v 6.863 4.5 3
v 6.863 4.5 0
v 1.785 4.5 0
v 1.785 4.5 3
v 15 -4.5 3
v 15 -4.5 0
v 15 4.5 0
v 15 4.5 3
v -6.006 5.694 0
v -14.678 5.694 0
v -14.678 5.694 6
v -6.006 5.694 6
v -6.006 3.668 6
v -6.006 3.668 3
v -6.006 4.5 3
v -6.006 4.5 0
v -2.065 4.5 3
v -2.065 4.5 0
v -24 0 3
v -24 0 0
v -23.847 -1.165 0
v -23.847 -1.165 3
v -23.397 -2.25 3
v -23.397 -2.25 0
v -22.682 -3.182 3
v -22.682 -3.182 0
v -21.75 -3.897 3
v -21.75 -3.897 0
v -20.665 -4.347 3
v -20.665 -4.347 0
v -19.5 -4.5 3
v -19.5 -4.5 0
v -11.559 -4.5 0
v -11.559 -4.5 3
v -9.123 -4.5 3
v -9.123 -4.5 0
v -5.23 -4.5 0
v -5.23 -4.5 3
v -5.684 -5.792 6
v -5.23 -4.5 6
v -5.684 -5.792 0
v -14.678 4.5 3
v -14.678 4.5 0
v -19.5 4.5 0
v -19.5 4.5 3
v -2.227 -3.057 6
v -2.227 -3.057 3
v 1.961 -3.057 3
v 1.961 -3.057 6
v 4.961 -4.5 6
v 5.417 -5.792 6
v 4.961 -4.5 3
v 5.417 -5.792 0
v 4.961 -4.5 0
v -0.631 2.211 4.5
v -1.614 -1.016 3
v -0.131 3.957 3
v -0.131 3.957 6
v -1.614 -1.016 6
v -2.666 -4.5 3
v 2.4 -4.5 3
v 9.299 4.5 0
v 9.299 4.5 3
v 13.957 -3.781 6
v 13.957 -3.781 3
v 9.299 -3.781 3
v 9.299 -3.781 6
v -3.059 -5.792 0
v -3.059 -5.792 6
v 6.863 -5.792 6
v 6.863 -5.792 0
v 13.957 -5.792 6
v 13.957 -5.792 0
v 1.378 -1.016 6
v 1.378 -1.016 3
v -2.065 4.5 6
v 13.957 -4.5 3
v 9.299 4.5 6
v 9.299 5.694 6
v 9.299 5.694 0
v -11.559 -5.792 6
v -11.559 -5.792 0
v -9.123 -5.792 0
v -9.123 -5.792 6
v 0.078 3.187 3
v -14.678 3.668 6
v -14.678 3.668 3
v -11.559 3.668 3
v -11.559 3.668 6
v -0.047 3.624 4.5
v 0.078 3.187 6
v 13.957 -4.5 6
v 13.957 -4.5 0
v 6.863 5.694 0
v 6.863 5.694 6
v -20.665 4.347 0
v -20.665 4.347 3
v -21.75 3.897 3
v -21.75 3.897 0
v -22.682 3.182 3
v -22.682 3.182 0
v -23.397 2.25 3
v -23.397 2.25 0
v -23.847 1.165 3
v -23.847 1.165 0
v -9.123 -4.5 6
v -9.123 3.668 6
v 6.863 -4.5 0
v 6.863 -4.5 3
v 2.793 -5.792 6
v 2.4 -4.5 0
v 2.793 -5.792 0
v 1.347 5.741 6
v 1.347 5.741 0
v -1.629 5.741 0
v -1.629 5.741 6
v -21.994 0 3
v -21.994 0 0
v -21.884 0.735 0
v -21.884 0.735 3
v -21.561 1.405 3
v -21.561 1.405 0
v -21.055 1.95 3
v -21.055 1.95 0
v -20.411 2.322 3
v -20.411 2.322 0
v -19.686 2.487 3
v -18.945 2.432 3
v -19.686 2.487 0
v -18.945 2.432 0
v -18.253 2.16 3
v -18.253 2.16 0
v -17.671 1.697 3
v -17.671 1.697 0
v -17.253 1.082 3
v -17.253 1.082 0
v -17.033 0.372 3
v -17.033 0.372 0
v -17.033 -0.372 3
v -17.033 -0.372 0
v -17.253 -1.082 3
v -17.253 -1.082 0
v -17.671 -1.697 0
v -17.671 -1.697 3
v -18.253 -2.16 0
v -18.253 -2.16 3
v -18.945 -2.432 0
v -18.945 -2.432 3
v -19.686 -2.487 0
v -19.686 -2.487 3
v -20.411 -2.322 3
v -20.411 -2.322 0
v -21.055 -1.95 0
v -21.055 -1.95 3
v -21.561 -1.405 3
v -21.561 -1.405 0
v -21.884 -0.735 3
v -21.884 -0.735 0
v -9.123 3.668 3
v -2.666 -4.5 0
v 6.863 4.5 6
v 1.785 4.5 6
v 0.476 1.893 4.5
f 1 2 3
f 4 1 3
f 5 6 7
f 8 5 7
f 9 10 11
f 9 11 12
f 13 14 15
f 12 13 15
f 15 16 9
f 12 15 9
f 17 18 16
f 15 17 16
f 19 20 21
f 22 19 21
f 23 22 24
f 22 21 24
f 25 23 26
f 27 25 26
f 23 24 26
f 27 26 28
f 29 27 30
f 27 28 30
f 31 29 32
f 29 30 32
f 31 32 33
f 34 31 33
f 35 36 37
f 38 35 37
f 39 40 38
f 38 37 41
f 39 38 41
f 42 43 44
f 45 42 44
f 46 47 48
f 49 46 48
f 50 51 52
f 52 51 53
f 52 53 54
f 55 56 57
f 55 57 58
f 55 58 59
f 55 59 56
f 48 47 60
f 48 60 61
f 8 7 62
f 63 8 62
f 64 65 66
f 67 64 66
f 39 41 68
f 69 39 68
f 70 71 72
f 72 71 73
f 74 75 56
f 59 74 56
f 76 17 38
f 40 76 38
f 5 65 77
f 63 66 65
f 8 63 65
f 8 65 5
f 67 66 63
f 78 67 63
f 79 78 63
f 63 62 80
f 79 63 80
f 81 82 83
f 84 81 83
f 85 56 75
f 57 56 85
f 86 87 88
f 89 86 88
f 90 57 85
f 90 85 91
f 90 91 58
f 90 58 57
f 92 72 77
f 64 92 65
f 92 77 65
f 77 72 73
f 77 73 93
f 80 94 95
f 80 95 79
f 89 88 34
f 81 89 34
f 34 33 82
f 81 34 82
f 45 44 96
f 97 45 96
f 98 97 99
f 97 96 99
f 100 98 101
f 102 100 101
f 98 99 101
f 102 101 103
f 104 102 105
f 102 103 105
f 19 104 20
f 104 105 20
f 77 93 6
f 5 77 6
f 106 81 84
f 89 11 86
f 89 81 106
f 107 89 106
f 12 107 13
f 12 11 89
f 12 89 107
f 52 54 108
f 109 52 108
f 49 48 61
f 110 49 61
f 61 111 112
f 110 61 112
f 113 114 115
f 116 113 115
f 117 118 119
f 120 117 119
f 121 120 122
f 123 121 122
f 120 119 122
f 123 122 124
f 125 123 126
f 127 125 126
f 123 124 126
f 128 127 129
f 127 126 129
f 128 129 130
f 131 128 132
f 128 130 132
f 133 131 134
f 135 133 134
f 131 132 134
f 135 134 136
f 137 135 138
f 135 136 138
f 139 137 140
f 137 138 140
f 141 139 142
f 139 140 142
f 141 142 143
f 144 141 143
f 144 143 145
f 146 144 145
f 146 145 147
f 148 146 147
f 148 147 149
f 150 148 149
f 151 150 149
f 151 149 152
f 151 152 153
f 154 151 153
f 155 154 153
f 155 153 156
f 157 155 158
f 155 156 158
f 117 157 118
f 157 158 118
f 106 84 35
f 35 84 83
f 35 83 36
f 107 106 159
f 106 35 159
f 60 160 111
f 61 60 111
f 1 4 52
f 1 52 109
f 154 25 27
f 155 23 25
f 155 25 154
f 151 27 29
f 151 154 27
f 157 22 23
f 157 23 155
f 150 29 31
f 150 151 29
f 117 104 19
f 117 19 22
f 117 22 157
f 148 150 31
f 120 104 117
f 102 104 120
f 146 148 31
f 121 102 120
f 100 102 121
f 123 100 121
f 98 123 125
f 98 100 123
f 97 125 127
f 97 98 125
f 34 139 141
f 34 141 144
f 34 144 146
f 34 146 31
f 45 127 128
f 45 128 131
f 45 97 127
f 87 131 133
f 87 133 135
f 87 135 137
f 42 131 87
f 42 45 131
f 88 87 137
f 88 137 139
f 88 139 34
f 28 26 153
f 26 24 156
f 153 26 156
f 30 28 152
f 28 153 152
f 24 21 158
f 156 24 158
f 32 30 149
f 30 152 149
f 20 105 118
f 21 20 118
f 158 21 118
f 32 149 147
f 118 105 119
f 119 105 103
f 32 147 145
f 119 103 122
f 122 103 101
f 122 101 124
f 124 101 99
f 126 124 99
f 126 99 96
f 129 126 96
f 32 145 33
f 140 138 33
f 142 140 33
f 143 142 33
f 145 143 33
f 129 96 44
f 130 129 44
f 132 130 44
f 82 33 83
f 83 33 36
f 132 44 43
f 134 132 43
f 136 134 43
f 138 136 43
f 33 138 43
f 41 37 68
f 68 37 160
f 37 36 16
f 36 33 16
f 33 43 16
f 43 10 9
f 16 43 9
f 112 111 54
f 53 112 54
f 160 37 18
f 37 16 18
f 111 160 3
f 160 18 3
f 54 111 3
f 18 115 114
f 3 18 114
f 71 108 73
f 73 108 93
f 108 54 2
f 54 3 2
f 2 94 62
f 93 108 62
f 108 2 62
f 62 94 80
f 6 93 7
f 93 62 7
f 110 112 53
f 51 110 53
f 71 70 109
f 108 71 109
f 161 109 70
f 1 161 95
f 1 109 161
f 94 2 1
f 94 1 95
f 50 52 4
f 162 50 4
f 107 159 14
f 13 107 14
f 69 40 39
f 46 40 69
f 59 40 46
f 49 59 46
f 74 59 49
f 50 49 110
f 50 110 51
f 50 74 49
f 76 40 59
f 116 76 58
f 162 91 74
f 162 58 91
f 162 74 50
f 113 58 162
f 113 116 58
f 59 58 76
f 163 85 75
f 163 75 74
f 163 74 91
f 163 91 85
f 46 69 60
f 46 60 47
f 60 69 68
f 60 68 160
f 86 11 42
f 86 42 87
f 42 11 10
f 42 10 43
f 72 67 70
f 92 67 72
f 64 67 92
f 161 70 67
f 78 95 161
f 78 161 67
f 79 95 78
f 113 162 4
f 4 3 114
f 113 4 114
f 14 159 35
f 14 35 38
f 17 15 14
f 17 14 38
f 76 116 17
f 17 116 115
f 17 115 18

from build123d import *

# Parameters (mm, degrees)
F1_DEPTH = 3
F0_W     = 2.4358974359
F0_H     = 1.292
F0_W_2   = 8.6726998492
F0_H_2   = 1.1936711916
F0_W_3   = 7.094017094
F2_DEPTH = 6


with BuildPart() as f1:
    # F0 (on Top) → F1 (new body)
    with BuildSketch(Plane.XY):
        with BuildLine():
            Line((-19.5, -4.5), (-15, -4.5))
            Line((-15, -4.5), (-15, 0))
            Line((-15, 0), (-17.0055641305, 0))
            ThreePointArc((-17.0055641305, 0), (-19.5, -2.4944358695), (-21.9944358695, 0))
            Line((-21.9944358695, 0), (-24, 0))
            ThreePointArc((-24, 0), (-22.6819805153, -3.1819805153), (-19.5, -4.5))
        make_face()
        with BuildLine():
            Line((-17.0055641305, 0), (-15, 0))
            Line((-15, 0), (-15, 4.5))
            Line((-15, 4.5), (-19.5, 4.5))
            ThreePointArc((-19.5, 4.5), (-22.6819805153, 3.1819805153), (-24, 0))
            Line((-24, 0), (-21.9944358695, 0))
            ThreePointArc((-21.9944358695, 0), (-19.5, 2.4944358695), (-17.0055641305, 0))
        make_face()
        Polygon((-15, 0), (-15, -4.5), (-11.5585721468, -4.5), (-11.5585721468, 3.6675274007), (-14.6782302665, 3.6675274007), (-14.6782302665, 4.5), (-15, 4.5), align=None)
    extrude(amount=F1_DEPTH)



with BuildPart() as f1b:
    # F0 (on Top) → F1, piece 2 (new body)
    with BuildSketch(Plane.XY):
        Polygon((-9.1226747109, 3.6675274007), (-9.1226747109, -4.5), (-5.2295331336, -4.5), (-2.0654093324, 4.5), (-6.0055304173, 4.5), (-6.0055304173, 3.6675274007), align=None)
    extrude(amount=F1_DEPTH)


with BuildPart() as f1c:
    # F0 (on Top) → F1, piece 3 (new body)
    with BuildSketch(Plane.XY):
        Polygon((-2.2272498743, -3.056957265), (-2.6662637946, -4.5), (2.399798234, -4.5), (1.9607843137, -3.056957265), align=None)
    extrude(amount=F1_DEPTH)


with BuildPart() as f1d:
    # F0 (on Top) → F1, piece 4 (new body)
    with BuildSketch(Plane.XY):
        with BuildLine():
            Line((-1.6138763198, -1.0157305178), (1.3775766717, -1.0157305178))
            add(Edge.make_bspline(
                [(1.3775766717, -1.0157305178), (0.2237305178, 2.6997043741), (0.0779286073, 3.1873866264)],
                knots=[0, 0, 0, 1, 1, 1], degree=2))
            add(Edge.make_bspline(
                [(0.0779286073, 3.1873866264), (-0.0678733032, 3.6750688788), (-0.1307189542, 3.9566173957)],
                knots=[0, 0, 0, 1, 1, 1], degree=2))
            add(Edge.make_bspline(
                [(-0.1307189542, 3.9566173957), (-0.3896430367, 2.9510869784), (-1.6138763198, -1.0157305178)],
                knots=[0, 0, 0, 1, 1, 1], degree=2))
        make_face()
    extrude(amount=F1_DEPTH)


with BuildPart() as f1e:
    # F0 (on Top) → F1, piece 5 (new body)
    with BuildSketch(Plane.XY):
        Polygon((6.862745098, 4.5), (1.7854843124, 4.5), (4.9613779479, -4.5), (6.862745098, -4.5), align=None)
    extrude(amount=F1_DEPTH)


with BuildPart() as f1f:
    # F0 (on Top) → F1, piece 6 (new body)
    with BuildSketch(Plane.XY):
        Polygon((15, 4.5), (9.2986425339, 4.5), (9.2986425339, -3.7809391654), (13.9567621921, -3.7809391654), (13.9567621921, -4.5), (15, -4.5), align=None)
    extrude(amount=F1_DEPTH)


with BuildPart() as f1_1:
    add(f1.part)

    add(f1b.part)  # F2 merges F1b

    add(f1c.part)  # F2 merges F1c

    add(f1d.part)  # F2 merges F1d

    add(f1e.part)  # F2 merges F1e

    add(f1f.part)  # F2 merges F1f
    # F0 (on Top) → F2 (join)
    with BuildSketch(Plane.XY):
        Polygon((-11.5585721468, 3.6675274007), (-11.5585721468, -4.5), (-9.1226747109, -4.5), (-9.1226747109, 3.6675274007), (-6.0055304173, 3.6675274007), (-6.0055304173, 4.5), (-14.6782302665, 4.5), (-14.6782302665, 3.6675274007), align=None)
        with Locations((-10.3406234289, -5.146)):
            Rectangle(F0_W, F0_H)
        with Locations((-10.3418803419, 5.0968355958)):
            Rectangle(F0_W_2, F0_H_2)
        Polygon((-2.0654093324, 4.5), (-5.2295331336, -4.5), (-2.6662637946, -4.5), (-2.2272498743, -3.056957265), (1.9607843137, -3.056957265), (2.399798234, -4.5), (4.9613779479, -4.5), (1.7854843124, 4.5), align=None)
        with BuildLine():
            add(Edge.make_bspline(
                [(1.3775766717, -1.0157305178), (0.2237305178, 2.6997043741), (0.0779286073, 3.1873866264)],
                knots=[0, 0, 0, 1, 1, 1], degree=2))
            Line((1.3775766717, -1.0157305178), (-1.6138763198, -1.0157305178))
            add(Edge.make_bspline(
                [(-0.1307189542, 3.9566173957), (-0.3896430367, 2.9510869784), (-1.6138763198, -1.0157305178)],
                knots=[0, 0, 0, 1, 1, 1], degree=2))
            add(Edge.make_bspline(
                [(0.0779286073, 3.1873866264), (-0.0678733032, 3.6750688788), (-0.1307189542, 3.9566173957)],
                knots=[0, 0, 0, 1, 1, 1], degree=2))
        make_face(mode=Mode.SUBTRACT)
        Polygon((4.9613779479, -4.5), (2.399798234, -4.5), (2.792860734, -5.792), (5.4172951232, -5.792), align=None)
        Polygon((-2.6662637946, -4.5), (-5.2295331336, -4.5), (-5.6837606838, -5.792), (-3.0593262946, -5.792), align=None)
        Polygon((-1.628959276, 5.7414338864), (-2.0654093324, 4.5), (1.7854843124, 4.5), (1.3474107592, 5.7414338864), align=None)
        with Locations((10.409753645, -5.146)):
            Rectangle(F0_W_3, F0_H)
        Polygon((9.2986425339, 4.5), (6.862745098, 4.5), (6.862745098, -4.5), (13.9567621921, -4.5), (13.9567621921, -3.7809391654), (9.2986425339, -3.7809391654), align=None)
        with Locations((8.080693816, 5.0968355958)):
            Rectangle(F0_W, F0_H_2)
    extrude(amount=F2_DEPTH)


solid = f1_1.part
